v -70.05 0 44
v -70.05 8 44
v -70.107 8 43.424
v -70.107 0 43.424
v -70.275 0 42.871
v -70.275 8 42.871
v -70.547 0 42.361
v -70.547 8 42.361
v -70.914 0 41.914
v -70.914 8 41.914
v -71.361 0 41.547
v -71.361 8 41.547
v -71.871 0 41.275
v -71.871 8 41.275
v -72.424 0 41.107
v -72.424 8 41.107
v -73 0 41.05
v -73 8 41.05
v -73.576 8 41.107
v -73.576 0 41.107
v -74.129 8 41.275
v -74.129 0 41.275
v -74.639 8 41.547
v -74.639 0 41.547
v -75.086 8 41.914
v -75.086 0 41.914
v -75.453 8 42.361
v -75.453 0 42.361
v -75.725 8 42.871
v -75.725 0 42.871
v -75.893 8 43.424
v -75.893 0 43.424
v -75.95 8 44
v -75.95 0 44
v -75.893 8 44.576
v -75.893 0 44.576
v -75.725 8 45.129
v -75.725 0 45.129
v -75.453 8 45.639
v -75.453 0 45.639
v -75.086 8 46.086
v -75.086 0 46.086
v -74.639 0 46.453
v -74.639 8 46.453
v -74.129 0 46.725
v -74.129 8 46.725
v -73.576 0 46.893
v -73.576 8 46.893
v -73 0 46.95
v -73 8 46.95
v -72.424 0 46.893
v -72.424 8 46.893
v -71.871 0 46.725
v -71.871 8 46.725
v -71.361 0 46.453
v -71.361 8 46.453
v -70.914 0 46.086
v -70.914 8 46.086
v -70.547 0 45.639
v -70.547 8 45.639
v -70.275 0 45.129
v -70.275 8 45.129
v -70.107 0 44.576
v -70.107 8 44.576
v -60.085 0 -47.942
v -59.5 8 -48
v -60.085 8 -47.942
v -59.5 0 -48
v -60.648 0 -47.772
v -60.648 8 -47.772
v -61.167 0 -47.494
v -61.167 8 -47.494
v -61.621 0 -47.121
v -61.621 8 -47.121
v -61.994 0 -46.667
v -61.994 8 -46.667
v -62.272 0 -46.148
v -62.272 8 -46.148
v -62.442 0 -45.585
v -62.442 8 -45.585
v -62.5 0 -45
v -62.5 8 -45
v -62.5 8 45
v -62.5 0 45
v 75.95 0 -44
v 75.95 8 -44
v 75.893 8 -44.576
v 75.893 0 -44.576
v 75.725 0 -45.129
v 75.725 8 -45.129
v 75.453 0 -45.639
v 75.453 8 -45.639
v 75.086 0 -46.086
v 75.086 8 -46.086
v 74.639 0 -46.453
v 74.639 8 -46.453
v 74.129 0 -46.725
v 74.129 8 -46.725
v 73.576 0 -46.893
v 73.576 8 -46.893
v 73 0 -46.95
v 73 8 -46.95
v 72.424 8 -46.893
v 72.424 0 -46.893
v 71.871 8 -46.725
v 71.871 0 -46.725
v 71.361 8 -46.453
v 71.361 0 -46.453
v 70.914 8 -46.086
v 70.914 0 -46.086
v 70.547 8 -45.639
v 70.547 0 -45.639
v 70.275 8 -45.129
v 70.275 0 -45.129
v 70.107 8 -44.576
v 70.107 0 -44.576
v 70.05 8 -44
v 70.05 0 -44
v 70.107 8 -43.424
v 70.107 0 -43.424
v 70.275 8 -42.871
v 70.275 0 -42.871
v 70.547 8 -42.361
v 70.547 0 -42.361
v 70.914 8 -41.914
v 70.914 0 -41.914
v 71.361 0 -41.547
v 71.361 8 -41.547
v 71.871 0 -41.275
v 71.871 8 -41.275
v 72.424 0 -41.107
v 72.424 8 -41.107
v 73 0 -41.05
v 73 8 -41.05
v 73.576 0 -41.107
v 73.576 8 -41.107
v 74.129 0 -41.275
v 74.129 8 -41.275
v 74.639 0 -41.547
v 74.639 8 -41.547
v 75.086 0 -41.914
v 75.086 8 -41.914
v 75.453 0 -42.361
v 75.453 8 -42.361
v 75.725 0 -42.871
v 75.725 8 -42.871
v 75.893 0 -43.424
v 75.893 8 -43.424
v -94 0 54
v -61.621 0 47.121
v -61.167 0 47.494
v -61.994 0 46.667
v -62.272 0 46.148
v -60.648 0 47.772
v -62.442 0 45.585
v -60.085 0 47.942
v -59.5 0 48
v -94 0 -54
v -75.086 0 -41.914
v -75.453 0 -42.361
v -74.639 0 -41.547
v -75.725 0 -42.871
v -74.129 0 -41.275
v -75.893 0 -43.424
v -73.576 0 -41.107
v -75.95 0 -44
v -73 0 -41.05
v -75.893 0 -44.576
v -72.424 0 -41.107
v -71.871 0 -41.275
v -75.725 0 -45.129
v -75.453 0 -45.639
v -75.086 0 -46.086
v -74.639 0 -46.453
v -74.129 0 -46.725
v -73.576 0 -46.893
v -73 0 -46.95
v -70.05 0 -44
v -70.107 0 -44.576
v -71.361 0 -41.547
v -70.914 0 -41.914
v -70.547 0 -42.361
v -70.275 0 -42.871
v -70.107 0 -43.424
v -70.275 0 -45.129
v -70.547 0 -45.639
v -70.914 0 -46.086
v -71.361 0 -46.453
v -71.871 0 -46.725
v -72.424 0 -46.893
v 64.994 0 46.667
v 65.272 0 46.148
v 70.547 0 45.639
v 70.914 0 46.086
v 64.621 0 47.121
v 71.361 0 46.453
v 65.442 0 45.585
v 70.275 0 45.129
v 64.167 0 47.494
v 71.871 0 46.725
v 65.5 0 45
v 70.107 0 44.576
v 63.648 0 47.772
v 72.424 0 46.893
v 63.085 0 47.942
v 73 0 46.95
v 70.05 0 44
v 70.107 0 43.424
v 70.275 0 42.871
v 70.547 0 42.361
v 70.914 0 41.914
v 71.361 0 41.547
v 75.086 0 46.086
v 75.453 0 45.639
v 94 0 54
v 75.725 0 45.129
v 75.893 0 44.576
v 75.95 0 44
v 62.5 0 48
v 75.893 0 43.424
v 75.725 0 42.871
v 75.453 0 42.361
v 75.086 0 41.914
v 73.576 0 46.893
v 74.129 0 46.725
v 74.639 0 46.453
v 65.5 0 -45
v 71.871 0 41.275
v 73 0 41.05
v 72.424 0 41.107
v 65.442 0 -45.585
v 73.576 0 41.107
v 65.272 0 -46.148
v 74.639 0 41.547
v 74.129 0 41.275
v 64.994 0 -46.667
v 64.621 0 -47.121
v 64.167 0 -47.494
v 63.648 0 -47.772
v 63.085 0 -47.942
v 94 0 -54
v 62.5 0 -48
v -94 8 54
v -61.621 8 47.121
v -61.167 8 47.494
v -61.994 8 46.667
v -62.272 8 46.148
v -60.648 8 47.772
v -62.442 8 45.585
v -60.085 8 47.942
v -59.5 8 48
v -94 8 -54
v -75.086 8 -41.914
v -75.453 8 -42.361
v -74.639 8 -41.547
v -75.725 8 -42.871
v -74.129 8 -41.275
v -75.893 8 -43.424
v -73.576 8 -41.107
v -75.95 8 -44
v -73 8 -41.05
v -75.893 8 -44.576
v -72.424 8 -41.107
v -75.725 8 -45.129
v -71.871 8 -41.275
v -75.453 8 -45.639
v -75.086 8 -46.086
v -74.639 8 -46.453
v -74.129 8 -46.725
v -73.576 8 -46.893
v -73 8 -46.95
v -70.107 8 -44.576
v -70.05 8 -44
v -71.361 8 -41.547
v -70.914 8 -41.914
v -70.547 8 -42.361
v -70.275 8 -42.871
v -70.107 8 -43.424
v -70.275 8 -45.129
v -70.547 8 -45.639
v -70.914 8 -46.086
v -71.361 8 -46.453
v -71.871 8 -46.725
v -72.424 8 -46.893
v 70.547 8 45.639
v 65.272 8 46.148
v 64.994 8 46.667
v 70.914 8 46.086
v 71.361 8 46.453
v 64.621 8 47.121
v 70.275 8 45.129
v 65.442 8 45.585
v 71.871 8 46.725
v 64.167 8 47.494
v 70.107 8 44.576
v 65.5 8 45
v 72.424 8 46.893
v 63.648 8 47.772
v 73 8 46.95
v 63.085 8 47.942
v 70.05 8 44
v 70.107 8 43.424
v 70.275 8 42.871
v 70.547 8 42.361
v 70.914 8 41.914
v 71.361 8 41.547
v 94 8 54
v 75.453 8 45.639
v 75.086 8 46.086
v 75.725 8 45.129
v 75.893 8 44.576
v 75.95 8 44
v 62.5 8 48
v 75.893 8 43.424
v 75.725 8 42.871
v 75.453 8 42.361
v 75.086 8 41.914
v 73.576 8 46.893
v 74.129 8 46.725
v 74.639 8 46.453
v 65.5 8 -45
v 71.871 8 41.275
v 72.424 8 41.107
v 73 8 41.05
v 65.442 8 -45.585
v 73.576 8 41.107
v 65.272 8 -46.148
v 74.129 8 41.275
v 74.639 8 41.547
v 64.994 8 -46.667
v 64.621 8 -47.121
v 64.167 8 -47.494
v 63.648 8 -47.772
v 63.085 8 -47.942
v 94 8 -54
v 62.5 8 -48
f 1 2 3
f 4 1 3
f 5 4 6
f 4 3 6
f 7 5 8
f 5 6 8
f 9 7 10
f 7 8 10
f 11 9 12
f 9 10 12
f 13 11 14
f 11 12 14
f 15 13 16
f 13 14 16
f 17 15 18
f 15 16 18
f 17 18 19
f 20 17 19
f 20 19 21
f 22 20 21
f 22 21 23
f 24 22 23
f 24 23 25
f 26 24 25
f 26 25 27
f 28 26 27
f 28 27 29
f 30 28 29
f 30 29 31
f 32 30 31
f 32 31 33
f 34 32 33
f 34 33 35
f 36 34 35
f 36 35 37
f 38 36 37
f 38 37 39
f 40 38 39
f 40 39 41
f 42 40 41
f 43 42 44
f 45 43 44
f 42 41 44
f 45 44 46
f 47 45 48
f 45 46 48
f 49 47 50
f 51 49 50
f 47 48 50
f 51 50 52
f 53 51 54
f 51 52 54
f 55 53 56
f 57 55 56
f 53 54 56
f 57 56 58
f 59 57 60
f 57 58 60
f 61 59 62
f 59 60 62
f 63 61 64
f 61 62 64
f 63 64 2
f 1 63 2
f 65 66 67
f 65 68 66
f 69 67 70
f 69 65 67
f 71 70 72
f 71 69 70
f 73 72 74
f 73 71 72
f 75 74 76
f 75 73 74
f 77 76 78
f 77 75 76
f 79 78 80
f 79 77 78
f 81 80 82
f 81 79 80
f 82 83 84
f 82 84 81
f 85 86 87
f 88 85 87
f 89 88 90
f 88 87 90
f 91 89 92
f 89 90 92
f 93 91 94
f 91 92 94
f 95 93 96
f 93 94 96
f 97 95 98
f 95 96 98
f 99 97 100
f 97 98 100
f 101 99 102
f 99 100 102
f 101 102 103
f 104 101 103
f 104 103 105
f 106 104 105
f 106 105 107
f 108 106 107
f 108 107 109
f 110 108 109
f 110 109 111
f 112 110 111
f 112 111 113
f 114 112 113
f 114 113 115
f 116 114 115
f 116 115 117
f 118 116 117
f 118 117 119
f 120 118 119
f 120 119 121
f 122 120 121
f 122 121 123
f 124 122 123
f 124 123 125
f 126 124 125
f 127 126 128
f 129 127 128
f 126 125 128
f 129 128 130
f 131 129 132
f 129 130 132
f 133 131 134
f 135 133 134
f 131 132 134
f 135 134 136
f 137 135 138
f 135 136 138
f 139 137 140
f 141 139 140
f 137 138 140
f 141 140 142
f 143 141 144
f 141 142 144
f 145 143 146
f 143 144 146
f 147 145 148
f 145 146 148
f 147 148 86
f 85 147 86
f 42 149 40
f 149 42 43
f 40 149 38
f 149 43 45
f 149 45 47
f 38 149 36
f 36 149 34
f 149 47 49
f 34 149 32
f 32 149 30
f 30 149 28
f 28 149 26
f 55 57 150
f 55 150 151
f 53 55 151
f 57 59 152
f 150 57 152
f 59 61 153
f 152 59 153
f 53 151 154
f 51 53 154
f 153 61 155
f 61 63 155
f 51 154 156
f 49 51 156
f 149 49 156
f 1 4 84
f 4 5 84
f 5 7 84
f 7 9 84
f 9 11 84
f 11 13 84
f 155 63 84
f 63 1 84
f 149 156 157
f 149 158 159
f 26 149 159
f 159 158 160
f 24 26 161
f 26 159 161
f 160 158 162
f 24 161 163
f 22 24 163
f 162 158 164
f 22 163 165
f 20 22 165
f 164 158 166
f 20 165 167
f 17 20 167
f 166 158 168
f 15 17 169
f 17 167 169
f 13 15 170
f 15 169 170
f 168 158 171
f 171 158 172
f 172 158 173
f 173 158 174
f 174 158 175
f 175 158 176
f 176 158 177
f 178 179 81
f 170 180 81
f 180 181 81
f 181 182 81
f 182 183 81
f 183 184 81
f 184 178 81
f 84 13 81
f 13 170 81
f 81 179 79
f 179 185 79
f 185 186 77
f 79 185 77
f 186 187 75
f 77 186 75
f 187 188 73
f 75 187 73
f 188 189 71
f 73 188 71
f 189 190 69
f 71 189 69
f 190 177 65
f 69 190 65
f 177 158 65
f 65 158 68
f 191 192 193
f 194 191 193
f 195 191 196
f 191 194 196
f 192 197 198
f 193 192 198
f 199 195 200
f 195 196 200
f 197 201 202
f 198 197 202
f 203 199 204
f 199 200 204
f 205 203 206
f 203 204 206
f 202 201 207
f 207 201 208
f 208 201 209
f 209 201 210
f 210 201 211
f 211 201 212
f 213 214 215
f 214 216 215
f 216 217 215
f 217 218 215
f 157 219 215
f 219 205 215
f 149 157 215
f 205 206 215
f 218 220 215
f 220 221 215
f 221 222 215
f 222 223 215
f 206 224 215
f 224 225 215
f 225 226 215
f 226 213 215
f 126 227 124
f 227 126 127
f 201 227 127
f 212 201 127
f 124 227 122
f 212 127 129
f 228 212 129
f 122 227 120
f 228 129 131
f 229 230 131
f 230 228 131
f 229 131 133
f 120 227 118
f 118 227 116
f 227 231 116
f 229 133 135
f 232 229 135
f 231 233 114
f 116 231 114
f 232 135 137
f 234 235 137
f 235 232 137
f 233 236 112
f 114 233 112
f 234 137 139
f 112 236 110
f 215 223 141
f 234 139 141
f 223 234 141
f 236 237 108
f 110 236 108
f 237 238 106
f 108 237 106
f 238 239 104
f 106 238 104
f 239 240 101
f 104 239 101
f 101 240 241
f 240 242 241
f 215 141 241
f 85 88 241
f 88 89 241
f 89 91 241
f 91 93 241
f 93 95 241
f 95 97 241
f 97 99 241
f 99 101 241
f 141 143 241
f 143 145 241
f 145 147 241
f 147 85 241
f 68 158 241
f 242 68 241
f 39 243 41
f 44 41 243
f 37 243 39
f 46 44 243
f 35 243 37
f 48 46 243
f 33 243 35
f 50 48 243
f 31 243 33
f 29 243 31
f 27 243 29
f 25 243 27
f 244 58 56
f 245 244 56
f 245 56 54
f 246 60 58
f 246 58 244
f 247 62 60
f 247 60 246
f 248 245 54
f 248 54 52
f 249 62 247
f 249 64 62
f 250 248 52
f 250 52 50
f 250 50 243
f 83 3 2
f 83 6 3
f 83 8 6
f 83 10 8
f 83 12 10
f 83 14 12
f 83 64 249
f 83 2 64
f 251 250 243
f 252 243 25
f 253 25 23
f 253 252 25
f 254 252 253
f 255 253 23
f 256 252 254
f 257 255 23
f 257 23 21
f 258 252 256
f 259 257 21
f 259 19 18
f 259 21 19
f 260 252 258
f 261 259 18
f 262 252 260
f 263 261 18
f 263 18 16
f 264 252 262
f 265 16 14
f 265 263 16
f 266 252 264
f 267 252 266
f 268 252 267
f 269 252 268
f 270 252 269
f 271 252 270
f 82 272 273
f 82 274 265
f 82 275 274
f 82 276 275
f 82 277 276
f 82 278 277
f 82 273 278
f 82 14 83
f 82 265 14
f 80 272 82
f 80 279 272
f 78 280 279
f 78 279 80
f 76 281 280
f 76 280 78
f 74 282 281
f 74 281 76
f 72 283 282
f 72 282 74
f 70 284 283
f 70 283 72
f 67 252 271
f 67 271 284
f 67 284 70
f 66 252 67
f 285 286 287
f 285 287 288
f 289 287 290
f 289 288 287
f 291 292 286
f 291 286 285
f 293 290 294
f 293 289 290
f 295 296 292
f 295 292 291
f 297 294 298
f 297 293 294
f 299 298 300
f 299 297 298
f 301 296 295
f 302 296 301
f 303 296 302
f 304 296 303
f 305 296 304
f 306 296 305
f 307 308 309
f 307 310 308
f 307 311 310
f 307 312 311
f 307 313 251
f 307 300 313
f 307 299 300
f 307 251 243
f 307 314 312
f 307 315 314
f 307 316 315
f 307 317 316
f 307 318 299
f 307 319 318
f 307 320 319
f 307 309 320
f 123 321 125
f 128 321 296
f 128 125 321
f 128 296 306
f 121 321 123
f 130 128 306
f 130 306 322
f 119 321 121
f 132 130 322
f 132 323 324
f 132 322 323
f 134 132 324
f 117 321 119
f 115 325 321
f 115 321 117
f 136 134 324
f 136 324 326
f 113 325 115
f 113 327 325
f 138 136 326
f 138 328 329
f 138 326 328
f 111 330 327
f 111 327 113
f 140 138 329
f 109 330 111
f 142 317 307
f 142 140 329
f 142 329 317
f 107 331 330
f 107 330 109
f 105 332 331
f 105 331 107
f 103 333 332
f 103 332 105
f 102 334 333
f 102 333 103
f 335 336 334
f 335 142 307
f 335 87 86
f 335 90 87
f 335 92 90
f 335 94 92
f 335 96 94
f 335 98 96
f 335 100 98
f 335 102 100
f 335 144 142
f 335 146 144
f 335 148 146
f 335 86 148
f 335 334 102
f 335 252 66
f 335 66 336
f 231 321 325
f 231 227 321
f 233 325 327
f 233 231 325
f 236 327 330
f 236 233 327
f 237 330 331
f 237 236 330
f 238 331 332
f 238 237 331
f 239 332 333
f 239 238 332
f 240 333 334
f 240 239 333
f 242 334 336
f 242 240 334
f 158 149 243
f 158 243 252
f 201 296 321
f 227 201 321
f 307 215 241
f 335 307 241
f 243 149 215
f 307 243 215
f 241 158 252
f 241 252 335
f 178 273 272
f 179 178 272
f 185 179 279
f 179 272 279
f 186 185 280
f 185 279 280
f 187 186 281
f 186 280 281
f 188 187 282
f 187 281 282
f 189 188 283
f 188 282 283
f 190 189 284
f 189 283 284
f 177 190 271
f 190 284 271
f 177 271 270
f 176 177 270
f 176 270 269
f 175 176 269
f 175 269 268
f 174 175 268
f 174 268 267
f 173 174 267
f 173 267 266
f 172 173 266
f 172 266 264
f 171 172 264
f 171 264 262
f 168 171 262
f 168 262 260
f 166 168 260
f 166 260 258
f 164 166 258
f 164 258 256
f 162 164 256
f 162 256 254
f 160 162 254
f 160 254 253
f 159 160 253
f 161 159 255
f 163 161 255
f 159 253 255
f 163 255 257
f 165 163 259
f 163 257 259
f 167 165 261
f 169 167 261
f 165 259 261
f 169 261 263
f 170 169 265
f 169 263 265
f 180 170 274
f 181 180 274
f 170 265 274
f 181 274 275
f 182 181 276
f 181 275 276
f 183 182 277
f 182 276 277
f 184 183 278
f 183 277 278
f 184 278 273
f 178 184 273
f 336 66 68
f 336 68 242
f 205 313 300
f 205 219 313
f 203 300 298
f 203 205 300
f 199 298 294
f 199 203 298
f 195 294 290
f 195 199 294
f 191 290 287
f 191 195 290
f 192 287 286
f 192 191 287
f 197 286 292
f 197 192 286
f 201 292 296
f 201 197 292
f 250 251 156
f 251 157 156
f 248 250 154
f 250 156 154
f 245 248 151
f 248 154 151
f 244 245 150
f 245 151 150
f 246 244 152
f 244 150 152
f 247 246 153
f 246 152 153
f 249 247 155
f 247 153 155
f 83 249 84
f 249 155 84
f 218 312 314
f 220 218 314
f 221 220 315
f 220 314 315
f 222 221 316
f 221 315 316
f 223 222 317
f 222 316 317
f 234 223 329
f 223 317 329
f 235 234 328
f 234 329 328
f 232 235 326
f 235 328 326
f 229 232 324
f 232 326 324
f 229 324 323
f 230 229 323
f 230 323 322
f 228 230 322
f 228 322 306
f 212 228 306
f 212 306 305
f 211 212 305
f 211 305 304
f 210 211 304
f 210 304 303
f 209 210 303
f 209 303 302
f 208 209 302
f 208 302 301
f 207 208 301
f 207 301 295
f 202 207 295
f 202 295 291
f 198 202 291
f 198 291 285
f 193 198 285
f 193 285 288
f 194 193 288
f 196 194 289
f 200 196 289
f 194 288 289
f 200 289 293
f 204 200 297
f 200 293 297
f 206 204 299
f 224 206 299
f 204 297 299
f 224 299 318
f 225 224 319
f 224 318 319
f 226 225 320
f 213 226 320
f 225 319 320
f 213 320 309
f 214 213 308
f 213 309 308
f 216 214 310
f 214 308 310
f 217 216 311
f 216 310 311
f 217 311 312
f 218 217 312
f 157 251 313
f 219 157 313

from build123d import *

# Parameters (mm, degrees)
SKETCH_1_W          = 188
SKETCH_1_H          = 108
EXTRUDE_1_DEPTH     = 8
SKETCH_2_R          = 2.95
SKETCH_2_W          = 128
SKETCH_2_H          = 96
CUT_EXTRUDE_1_DEPTH = 9
FILLET_1_R          = 3


with BuildPart() as part:
    # Эскиз1 → Бобышка-Вытянуть1 (new body)
    with BuildSketch(Plane(origin=(0, 0, 0), x_dir=(1, 0, 0), z_dir=(0, 1, 0))):
        Rectangle(SKETCH_1_W, SKETCH_1_H)
    extrude(amount=EXTRUDE_1_DEPTH)

    # Эскиз2 → Вырез-Вытянуть1 (cut, through all)
    with BuildSketch(Plane(origin=(0, 8, 0), x_dir=(1, 0, 0), z_dir=(0, 1, 0))):
        with Locations((-73, 44)):
            Circle(SKETCH_2_R)
        with Locations((73, 44)):
            Circle(SKETCH_2_R)
        with Locations((-73, -44)):
            Circle(SKETCH_2_R)
        with Locations((73, -44)):
            Circle(SKETCH_2_R)
        with Locations((1.5, 0)):
            Rectangle(SKETCH_2_W, SKETCH_2_H)
    extrude(amount=-CUT_EXTRUDE_1_DEPTH, mode=Mode.SUBTRACT)

    # Скругление1
    fillet_1_edges = [part.edges().sort_by_distance(p)[0] for p in [
        (65.5, 4, -48),
        (65.5, 4, 48),
        (-62.5, 4, 48),
        (-62.5, 4, -48),
    ]]
    fillet(fillet_1_edges, radius=FILLET_1_R)


solid = part.part
